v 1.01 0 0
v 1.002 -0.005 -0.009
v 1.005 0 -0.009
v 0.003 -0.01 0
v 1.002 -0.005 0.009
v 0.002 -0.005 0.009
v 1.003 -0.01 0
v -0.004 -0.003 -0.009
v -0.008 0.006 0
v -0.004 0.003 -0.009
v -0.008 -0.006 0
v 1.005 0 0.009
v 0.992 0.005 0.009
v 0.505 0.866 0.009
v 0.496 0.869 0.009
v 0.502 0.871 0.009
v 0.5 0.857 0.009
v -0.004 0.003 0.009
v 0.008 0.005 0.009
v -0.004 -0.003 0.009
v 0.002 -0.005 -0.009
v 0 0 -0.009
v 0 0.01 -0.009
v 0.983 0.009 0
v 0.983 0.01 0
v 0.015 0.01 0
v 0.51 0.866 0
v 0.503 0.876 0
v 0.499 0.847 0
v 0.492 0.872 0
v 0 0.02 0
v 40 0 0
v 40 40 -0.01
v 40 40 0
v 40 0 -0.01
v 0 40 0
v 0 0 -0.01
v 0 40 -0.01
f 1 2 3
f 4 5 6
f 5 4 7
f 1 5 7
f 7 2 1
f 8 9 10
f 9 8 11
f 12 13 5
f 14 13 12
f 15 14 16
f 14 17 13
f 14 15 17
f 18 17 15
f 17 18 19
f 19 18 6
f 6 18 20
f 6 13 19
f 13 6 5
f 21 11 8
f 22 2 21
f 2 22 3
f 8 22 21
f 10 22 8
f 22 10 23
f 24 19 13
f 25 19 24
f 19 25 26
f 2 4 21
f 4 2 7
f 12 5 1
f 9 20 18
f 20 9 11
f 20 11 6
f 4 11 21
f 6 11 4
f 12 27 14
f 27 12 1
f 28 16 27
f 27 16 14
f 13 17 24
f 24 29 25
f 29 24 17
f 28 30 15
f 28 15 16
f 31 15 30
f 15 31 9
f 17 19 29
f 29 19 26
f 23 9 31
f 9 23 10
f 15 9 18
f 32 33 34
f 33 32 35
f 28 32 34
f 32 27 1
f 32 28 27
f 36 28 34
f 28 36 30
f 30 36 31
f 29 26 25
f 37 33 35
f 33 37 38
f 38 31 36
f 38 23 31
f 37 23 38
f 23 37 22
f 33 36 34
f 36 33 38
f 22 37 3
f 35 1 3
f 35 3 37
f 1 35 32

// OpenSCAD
hull(){
    translate([0.0, 0.0]) sphere(0.01);
    translate([1.0, 0.0]) sphere(0.01);
}
hull(){
    translate([1.0, 0.0]) sphere(0.01);
    translate([0.5, 0.8660254038]) sphere(0.01);
}
hull(){
    translate([0.5, 0.8660254038]) sphere(0.01);
    translate([0.0, 0.0]) sphere(0.01);
}
hull(){
    translate([0.0, 0.0]) sphere(0.01);
    translate([0.0, 0.0]) sphere(0.01);
}
hull(){
    translate([0.0, 0.0]) sphere(0.01);
    translate([0.0, 0.0]) sphere(0.01);
}
hull(){
    translate([0.0, 0.0]) sphere(0.01);
    translate([0.0, 0.0]) sphere(0.01);
}
hull(){
    translate([0.0, 0.0]) sphere(0.01);
    translate([0.0, 0.0]) sphere(0.01);
}
hull(){
    translate([0.0, 0.0]) sphere(0.01);
    translate([0.0, 0.0]) sphere(0.01);
}
translate([0,0,-0.01]) color([0.1,0.1,0.1]) cube([40,40,0.01]);
